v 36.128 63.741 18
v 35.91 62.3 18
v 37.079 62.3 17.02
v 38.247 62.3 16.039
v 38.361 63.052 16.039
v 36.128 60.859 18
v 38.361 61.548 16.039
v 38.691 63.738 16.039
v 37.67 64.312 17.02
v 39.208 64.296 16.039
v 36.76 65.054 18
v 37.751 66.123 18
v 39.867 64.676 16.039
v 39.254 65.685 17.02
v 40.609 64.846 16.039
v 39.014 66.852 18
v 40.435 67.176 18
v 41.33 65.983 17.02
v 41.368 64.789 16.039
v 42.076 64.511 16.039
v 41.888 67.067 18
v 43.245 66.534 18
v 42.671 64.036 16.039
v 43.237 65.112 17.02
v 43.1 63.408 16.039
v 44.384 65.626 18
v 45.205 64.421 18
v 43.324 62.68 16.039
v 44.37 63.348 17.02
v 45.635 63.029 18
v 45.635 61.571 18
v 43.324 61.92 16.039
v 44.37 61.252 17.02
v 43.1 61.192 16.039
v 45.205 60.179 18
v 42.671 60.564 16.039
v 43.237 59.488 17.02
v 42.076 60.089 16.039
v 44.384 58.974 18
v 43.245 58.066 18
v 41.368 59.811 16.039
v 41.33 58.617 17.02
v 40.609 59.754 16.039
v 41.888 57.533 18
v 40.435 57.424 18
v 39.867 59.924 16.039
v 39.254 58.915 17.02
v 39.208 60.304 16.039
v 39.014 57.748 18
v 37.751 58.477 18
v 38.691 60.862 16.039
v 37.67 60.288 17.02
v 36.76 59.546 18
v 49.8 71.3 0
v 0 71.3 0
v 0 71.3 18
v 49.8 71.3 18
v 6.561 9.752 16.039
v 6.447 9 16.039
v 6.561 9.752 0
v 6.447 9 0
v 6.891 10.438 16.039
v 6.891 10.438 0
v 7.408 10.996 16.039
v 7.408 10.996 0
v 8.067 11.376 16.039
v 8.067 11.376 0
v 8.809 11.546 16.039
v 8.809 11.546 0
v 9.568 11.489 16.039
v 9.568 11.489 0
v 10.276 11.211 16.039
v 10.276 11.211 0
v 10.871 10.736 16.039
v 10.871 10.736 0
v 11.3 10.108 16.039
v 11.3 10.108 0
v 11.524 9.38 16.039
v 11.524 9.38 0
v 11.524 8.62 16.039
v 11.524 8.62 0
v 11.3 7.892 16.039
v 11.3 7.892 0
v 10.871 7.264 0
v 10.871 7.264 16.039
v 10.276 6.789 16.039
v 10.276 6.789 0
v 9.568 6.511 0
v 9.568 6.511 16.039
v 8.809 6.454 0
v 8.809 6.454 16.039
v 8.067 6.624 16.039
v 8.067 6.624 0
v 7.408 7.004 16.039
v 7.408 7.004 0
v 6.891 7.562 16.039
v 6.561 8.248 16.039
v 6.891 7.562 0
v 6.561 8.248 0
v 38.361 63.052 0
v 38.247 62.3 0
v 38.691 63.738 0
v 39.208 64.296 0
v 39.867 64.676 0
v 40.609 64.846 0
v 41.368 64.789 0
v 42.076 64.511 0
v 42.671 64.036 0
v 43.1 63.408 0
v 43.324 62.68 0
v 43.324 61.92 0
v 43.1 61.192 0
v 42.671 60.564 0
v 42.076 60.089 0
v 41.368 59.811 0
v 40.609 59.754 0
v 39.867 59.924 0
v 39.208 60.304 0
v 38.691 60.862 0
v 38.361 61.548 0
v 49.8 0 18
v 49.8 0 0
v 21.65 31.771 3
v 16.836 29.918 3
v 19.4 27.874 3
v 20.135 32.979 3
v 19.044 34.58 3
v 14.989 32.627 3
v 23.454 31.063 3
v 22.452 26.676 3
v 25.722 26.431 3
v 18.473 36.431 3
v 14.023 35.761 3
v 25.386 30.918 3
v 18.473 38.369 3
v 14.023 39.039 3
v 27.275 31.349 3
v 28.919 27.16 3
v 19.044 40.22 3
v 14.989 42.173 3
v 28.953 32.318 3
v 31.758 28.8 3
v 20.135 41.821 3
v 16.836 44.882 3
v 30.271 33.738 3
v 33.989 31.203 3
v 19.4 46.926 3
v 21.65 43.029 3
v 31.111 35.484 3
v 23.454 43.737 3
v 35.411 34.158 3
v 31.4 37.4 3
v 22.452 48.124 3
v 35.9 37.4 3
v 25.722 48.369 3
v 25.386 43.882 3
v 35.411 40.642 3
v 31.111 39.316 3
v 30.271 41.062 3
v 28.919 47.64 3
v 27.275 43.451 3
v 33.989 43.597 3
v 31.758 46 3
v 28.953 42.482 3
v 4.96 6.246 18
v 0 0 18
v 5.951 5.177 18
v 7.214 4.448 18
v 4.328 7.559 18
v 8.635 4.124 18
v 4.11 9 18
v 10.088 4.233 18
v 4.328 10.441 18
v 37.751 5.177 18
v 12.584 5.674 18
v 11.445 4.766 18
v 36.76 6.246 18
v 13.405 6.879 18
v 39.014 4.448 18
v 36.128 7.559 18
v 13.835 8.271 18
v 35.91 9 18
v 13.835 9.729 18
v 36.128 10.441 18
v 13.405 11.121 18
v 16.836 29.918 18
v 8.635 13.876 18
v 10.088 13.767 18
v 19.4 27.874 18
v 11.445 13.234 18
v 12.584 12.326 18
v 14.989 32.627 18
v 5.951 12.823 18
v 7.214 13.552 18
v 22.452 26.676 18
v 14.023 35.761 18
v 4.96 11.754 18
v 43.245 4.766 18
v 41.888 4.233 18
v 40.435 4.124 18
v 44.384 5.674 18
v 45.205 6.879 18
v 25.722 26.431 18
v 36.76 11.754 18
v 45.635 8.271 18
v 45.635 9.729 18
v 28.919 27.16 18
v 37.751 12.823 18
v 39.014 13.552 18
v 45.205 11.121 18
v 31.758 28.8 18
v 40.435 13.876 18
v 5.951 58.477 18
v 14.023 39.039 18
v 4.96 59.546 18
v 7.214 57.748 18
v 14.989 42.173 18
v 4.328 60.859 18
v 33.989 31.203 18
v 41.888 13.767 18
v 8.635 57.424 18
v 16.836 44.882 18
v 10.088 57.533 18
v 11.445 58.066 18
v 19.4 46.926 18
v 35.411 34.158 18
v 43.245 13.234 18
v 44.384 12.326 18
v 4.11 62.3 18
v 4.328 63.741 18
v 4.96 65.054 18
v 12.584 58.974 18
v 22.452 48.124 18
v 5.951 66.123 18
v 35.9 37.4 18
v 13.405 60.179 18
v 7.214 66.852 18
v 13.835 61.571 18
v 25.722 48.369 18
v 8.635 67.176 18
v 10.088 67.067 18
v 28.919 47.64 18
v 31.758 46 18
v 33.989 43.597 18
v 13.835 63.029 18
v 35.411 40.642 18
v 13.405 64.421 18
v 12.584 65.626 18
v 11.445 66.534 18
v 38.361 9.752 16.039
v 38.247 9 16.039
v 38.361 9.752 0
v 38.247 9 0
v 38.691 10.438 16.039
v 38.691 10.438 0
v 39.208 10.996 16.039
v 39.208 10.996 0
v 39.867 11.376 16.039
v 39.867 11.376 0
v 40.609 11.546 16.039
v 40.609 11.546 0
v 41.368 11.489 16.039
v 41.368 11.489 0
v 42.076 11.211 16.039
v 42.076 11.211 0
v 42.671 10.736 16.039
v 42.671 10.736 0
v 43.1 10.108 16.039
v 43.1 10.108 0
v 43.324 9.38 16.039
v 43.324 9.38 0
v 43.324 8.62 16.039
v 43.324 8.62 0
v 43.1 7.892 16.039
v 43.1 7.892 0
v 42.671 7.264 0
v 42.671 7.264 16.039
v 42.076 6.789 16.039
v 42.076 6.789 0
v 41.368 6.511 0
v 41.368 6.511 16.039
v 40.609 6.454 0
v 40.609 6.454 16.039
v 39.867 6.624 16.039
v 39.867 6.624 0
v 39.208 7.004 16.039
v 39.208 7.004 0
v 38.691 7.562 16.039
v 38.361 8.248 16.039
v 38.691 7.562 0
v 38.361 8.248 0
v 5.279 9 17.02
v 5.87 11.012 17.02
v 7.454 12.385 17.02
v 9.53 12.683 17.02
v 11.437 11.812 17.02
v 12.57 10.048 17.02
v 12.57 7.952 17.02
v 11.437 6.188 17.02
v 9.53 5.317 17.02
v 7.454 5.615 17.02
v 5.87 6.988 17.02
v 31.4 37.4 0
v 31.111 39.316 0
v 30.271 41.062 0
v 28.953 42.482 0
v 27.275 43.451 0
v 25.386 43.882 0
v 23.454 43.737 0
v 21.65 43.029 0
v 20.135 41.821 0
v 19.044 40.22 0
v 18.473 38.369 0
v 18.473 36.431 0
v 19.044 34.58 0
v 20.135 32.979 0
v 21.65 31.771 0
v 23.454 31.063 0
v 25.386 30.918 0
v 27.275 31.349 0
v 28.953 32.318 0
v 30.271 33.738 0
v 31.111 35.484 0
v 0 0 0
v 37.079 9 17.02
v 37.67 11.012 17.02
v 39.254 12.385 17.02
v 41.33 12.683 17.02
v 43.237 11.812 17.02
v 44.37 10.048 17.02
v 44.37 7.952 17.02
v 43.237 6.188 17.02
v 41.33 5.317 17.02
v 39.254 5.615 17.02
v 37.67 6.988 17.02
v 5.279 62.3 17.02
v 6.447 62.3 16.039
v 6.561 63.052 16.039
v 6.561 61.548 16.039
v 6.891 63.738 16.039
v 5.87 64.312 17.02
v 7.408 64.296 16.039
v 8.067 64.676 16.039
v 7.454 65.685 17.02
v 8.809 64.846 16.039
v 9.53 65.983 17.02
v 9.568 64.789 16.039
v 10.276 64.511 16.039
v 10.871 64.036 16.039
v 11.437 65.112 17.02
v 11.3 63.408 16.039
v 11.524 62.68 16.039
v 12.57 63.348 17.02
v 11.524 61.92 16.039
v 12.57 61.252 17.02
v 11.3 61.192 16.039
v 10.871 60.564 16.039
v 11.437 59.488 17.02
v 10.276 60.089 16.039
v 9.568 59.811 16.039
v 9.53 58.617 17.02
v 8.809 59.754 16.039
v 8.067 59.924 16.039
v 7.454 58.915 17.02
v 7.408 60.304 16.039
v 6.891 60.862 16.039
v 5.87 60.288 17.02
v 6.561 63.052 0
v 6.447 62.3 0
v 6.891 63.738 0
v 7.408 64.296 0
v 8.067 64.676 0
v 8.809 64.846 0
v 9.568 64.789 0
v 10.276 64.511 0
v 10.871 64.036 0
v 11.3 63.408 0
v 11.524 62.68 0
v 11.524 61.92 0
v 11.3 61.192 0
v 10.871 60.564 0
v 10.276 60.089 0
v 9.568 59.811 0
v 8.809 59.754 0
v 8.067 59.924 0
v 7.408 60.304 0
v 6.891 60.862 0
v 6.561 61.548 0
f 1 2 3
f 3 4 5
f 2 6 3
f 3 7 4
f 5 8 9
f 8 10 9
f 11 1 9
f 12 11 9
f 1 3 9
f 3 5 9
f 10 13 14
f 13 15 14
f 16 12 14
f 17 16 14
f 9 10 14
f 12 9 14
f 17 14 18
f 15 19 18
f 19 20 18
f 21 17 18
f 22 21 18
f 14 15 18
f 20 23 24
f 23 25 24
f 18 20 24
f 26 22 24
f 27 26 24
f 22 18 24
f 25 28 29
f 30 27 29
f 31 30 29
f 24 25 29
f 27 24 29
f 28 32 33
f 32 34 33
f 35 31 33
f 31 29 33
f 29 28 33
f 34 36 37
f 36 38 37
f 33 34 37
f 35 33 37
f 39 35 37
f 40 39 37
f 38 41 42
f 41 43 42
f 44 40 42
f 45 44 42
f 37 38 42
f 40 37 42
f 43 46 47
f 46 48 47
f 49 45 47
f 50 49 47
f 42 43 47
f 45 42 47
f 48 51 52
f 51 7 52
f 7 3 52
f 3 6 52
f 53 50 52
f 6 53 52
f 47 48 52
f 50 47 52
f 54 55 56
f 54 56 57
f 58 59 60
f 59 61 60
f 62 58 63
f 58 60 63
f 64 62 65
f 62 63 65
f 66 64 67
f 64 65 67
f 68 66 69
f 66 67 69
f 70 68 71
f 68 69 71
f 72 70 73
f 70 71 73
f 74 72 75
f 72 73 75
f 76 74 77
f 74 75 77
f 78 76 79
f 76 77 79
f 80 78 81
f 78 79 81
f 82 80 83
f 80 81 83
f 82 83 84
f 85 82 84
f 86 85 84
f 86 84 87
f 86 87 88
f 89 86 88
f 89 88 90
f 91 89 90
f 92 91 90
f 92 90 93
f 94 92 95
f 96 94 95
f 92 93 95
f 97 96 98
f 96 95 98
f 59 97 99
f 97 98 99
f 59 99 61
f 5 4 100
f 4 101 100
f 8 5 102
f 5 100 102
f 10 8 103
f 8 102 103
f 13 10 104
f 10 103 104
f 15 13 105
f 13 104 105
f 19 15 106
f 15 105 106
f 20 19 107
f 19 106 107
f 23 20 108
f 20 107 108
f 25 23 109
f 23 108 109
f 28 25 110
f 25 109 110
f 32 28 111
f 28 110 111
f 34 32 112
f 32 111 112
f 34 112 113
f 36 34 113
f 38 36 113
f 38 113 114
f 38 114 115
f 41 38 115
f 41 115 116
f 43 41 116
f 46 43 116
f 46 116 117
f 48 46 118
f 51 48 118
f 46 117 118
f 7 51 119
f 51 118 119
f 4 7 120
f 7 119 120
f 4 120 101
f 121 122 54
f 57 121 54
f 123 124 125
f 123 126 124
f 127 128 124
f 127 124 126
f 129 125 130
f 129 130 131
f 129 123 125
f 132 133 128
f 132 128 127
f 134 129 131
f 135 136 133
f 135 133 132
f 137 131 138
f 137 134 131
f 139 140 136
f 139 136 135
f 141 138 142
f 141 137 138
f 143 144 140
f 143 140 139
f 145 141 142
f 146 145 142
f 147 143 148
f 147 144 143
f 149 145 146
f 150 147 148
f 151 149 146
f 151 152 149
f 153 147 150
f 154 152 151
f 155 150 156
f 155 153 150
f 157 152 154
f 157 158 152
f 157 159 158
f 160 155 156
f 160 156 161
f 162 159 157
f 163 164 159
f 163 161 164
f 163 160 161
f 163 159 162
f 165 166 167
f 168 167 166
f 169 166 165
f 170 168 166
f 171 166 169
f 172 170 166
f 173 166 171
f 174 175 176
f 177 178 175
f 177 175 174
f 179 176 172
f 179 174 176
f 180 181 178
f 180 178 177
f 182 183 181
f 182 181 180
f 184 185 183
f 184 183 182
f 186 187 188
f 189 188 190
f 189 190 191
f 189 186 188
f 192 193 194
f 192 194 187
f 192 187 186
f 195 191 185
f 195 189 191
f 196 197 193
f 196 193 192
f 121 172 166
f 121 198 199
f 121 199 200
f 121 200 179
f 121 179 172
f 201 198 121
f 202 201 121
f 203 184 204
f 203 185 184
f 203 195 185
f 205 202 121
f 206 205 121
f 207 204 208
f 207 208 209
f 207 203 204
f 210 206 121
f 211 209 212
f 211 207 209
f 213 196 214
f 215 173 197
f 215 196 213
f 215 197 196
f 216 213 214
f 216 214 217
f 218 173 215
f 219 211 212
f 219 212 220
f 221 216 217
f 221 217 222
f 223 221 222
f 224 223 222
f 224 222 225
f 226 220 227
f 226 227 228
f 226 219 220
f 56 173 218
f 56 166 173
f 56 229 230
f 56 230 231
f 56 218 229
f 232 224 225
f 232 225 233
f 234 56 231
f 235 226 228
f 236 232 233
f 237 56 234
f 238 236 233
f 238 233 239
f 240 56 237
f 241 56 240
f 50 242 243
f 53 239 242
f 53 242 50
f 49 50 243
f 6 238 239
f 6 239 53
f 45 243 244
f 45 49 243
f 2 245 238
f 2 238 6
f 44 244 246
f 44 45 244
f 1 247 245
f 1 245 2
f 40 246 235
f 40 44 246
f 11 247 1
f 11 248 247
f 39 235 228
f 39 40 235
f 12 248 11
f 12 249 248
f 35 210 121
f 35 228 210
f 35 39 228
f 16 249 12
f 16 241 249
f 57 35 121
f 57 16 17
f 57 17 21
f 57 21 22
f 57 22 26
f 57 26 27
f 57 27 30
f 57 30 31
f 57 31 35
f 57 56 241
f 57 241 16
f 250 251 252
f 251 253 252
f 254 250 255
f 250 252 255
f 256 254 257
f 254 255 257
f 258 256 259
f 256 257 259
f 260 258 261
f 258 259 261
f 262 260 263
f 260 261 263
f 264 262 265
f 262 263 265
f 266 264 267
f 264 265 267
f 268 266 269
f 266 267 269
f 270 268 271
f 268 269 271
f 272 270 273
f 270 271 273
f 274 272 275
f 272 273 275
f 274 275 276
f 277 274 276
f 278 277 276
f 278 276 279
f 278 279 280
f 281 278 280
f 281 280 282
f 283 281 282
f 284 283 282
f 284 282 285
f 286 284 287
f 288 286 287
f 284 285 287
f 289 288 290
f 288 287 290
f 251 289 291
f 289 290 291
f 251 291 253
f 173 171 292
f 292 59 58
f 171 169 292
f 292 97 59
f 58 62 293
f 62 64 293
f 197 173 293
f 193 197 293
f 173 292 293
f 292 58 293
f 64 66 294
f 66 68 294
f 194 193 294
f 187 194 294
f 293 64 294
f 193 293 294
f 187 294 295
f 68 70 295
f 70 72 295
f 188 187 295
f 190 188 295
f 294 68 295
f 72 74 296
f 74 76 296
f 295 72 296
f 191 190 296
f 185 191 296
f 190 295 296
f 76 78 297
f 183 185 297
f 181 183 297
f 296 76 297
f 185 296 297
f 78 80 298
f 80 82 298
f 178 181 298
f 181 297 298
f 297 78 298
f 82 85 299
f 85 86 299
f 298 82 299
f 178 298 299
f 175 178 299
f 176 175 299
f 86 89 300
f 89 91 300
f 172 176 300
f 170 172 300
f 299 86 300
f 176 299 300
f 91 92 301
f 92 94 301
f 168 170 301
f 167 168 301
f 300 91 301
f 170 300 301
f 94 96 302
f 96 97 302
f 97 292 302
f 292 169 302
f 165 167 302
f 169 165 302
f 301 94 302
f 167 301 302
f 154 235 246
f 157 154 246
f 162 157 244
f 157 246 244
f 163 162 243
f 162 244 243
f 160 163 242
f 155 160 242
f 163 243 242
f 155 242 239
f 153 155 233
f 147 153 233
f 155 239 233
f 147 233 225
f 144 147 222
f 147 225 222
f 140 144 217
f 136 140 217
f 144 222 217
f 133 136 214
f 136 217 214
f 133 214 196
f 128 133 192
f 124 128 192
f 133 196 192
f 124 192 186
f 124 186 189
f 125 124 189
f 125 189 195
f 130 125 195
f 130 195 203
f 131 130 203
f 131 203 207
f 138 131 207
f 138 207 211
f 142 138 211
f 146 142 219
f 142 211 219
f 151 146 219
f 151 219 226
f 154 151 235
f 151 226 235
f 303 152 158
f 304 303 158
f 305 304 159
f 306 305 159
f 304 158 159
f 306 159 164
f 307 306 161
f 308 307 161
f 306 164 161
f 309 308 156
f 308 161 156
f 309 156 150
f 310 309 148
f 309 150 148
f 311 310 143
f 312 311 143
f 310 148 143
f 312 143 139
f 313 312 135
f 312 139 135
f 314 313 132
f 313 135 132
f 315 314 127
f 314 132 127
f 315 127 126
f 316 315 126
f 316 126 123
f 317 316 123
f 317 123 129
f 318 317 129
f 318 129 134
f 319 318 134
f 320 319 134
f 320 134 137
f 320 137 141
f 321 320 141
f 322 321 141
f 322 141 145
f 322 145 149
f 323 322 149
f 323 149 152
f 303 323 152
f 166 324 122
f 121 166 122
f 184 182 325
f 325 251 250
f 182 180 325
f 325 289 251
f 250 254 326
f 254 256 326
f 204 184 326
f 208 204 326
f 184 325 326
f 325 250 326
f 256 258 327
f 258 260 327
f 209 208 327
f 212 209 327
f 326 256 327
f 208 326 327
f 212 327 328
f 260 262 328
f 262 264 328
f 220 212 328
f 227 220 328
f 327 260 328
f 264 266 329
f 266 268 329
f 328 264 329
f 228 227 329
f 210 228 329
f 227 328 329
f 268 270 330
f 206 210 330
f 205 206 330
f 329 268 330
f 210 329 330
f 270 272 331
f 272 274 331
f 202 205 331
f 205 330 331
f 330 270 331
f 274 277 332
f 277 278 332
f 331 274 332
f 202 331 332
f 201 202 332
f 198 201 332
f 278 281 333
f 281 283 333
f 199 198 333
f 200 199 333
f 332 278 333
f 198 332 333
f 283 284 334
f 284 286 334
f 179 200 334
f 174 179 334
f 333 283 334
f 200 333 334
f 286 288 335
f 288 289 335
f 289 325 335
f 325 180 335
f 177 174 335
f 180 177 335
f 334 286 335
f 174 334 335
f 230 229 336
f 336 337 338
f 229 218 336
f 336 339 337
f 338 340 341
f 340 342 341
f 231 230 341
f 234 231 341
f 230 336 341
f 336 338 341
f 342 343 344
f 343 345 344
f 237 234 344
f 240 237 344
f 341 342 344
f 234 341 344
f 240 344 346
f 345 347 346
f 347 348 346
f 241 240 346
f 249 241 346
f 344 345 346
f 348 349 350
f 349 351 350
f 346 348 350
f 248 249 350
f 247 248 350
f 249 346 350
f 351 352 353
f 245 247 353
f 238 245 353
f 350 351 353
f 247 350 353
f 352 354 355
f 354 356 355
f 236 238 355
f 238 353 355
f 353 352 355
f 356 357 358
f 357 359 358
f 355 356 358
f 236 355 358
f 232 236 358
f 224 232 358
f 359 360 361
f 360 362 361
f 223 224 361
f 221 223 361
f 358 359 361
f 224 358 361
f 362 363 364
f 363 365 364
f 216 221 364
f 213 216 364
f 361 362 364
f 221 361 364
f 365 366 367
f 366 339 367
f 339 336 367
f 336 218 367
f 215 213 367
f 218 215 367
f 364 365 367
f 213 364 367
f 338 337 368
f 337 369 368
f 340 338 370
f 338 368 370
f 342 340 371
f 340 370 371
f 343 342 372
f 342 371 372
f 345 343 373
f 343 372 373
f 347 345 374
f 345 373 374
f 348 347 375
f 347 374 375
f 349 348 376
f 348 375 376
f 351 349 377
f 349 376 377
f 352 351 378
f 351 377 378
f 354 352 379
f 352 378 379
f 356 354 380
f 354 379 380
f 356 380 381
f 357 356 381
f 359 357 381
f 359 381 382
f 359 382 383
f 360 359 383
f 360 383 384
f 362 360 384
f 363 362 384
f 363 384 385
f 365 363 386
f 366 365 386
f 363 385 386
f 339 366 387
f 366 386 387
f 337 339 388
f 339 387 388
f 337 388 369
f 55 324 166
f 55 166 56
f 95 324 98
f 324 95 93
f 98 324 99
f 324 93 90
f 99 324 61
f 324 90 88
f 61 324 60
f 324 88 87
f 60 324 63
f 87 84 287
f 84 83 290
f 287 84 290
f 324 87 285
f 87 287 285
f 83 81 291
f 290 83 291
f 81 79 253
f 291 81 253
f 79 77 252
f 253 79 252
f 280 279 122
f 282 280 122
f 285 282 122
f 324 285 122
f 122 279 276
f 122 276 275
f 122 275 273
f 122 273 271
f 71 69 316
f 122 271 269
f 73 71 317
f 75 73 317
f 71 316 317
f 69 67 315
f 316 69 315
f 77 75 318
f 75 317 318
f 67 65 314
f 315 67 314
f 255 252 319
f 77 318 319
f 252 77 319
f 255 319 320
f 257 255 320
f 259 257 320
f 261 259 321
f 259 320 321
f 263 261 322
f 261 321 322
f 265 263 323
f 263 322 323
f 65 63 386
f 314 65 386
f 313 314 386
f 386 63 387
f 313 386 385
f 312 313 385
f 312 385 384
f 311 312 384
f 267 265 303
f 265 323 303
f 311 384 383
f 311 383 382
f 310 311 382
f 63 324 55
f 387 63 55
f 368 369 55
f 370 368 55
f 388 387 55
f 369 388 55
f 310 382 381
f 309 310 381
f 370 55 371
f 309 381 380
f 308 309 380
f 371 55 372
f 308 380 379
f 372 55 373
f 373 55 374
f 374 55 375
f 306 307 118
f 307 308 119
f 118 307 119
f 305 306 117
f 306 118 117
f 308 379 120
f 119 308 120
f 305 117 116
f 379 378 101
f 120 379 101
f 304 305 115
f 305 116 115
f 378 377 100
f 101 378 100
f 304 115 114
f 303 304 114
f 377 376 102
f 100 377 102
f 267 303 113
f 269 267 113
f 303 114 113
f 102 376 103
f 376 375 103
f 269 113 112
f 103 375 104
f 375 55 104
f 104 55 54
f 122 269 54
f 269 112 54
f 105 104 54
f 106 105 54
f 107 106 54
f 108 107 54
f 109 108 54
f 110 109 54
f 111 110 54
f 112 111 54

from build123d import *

# Parameters (mm, degrees)
SKETCH1_W                       = 49.8
SKETCH1_H                       = 71.3
BASE_DEPTH                      = 18
SKETCH2_R                       = 11
LEAD_NUT_INLAY_DEPTH            = 15
SKETCH3_R                       = 6.5
LEAD_SCREW_CLEARANCE_DEPTH      = 89.253781789
WOODSCREW_CLEARANCE_D           = 5.1054
WOODSCREW_CLEARANCE_CSINK_D     = 9.779
WOODSCREW_CLEARANCE_CSINK_ANGLE = 100


with BuildPart() as part:
    # Sketch1 → base (new body)
    with BuildSketch(Plane.XY):
        with Locations((24.9, 35.65)):
            Rectangle(SKETCH1_W, SKETCH1_H)
    extrude(amount=BASE_DEPTH)

    # Sketch2 → lead nut inlay (cut)
    with BuildSketch(Plane.XY.offset(18)):
        with Locations((24.9, 37.4)):
            Circle(SKETCH2_R)
    extrude(amount=-LEAD_NUT_INLAY_DEPTH, mode=Mode.SUBTRACT)

    # Sketch3 → lead screw clearance (cut, through all)
    with BuildSketch(Plane.XY.offset(3)):
        with Locations((24.9, 37.4)):
            Circle(SKETCH3_R)
    extrude(amount=-LEAD_SCREW_CLEARANCE_DEPTH, mode=Mode.SUBTRACT)

    # woodscrew clearance (through all)
    with Locations(Plane.XY.offset(18)):
        with Locations((9, 9), (40.8, 62.3), (9, 62.3), (40.8, 9)):
            CounterSinkHole(WOODSCREW_CLEARANCE_D / 2, WOODSCREW_CLEARANCE_CSINK_D / 2, counter_sink_angle=WOODSCREW_CLEARANCE_CSINK_ANGLE)


solid = part.part
